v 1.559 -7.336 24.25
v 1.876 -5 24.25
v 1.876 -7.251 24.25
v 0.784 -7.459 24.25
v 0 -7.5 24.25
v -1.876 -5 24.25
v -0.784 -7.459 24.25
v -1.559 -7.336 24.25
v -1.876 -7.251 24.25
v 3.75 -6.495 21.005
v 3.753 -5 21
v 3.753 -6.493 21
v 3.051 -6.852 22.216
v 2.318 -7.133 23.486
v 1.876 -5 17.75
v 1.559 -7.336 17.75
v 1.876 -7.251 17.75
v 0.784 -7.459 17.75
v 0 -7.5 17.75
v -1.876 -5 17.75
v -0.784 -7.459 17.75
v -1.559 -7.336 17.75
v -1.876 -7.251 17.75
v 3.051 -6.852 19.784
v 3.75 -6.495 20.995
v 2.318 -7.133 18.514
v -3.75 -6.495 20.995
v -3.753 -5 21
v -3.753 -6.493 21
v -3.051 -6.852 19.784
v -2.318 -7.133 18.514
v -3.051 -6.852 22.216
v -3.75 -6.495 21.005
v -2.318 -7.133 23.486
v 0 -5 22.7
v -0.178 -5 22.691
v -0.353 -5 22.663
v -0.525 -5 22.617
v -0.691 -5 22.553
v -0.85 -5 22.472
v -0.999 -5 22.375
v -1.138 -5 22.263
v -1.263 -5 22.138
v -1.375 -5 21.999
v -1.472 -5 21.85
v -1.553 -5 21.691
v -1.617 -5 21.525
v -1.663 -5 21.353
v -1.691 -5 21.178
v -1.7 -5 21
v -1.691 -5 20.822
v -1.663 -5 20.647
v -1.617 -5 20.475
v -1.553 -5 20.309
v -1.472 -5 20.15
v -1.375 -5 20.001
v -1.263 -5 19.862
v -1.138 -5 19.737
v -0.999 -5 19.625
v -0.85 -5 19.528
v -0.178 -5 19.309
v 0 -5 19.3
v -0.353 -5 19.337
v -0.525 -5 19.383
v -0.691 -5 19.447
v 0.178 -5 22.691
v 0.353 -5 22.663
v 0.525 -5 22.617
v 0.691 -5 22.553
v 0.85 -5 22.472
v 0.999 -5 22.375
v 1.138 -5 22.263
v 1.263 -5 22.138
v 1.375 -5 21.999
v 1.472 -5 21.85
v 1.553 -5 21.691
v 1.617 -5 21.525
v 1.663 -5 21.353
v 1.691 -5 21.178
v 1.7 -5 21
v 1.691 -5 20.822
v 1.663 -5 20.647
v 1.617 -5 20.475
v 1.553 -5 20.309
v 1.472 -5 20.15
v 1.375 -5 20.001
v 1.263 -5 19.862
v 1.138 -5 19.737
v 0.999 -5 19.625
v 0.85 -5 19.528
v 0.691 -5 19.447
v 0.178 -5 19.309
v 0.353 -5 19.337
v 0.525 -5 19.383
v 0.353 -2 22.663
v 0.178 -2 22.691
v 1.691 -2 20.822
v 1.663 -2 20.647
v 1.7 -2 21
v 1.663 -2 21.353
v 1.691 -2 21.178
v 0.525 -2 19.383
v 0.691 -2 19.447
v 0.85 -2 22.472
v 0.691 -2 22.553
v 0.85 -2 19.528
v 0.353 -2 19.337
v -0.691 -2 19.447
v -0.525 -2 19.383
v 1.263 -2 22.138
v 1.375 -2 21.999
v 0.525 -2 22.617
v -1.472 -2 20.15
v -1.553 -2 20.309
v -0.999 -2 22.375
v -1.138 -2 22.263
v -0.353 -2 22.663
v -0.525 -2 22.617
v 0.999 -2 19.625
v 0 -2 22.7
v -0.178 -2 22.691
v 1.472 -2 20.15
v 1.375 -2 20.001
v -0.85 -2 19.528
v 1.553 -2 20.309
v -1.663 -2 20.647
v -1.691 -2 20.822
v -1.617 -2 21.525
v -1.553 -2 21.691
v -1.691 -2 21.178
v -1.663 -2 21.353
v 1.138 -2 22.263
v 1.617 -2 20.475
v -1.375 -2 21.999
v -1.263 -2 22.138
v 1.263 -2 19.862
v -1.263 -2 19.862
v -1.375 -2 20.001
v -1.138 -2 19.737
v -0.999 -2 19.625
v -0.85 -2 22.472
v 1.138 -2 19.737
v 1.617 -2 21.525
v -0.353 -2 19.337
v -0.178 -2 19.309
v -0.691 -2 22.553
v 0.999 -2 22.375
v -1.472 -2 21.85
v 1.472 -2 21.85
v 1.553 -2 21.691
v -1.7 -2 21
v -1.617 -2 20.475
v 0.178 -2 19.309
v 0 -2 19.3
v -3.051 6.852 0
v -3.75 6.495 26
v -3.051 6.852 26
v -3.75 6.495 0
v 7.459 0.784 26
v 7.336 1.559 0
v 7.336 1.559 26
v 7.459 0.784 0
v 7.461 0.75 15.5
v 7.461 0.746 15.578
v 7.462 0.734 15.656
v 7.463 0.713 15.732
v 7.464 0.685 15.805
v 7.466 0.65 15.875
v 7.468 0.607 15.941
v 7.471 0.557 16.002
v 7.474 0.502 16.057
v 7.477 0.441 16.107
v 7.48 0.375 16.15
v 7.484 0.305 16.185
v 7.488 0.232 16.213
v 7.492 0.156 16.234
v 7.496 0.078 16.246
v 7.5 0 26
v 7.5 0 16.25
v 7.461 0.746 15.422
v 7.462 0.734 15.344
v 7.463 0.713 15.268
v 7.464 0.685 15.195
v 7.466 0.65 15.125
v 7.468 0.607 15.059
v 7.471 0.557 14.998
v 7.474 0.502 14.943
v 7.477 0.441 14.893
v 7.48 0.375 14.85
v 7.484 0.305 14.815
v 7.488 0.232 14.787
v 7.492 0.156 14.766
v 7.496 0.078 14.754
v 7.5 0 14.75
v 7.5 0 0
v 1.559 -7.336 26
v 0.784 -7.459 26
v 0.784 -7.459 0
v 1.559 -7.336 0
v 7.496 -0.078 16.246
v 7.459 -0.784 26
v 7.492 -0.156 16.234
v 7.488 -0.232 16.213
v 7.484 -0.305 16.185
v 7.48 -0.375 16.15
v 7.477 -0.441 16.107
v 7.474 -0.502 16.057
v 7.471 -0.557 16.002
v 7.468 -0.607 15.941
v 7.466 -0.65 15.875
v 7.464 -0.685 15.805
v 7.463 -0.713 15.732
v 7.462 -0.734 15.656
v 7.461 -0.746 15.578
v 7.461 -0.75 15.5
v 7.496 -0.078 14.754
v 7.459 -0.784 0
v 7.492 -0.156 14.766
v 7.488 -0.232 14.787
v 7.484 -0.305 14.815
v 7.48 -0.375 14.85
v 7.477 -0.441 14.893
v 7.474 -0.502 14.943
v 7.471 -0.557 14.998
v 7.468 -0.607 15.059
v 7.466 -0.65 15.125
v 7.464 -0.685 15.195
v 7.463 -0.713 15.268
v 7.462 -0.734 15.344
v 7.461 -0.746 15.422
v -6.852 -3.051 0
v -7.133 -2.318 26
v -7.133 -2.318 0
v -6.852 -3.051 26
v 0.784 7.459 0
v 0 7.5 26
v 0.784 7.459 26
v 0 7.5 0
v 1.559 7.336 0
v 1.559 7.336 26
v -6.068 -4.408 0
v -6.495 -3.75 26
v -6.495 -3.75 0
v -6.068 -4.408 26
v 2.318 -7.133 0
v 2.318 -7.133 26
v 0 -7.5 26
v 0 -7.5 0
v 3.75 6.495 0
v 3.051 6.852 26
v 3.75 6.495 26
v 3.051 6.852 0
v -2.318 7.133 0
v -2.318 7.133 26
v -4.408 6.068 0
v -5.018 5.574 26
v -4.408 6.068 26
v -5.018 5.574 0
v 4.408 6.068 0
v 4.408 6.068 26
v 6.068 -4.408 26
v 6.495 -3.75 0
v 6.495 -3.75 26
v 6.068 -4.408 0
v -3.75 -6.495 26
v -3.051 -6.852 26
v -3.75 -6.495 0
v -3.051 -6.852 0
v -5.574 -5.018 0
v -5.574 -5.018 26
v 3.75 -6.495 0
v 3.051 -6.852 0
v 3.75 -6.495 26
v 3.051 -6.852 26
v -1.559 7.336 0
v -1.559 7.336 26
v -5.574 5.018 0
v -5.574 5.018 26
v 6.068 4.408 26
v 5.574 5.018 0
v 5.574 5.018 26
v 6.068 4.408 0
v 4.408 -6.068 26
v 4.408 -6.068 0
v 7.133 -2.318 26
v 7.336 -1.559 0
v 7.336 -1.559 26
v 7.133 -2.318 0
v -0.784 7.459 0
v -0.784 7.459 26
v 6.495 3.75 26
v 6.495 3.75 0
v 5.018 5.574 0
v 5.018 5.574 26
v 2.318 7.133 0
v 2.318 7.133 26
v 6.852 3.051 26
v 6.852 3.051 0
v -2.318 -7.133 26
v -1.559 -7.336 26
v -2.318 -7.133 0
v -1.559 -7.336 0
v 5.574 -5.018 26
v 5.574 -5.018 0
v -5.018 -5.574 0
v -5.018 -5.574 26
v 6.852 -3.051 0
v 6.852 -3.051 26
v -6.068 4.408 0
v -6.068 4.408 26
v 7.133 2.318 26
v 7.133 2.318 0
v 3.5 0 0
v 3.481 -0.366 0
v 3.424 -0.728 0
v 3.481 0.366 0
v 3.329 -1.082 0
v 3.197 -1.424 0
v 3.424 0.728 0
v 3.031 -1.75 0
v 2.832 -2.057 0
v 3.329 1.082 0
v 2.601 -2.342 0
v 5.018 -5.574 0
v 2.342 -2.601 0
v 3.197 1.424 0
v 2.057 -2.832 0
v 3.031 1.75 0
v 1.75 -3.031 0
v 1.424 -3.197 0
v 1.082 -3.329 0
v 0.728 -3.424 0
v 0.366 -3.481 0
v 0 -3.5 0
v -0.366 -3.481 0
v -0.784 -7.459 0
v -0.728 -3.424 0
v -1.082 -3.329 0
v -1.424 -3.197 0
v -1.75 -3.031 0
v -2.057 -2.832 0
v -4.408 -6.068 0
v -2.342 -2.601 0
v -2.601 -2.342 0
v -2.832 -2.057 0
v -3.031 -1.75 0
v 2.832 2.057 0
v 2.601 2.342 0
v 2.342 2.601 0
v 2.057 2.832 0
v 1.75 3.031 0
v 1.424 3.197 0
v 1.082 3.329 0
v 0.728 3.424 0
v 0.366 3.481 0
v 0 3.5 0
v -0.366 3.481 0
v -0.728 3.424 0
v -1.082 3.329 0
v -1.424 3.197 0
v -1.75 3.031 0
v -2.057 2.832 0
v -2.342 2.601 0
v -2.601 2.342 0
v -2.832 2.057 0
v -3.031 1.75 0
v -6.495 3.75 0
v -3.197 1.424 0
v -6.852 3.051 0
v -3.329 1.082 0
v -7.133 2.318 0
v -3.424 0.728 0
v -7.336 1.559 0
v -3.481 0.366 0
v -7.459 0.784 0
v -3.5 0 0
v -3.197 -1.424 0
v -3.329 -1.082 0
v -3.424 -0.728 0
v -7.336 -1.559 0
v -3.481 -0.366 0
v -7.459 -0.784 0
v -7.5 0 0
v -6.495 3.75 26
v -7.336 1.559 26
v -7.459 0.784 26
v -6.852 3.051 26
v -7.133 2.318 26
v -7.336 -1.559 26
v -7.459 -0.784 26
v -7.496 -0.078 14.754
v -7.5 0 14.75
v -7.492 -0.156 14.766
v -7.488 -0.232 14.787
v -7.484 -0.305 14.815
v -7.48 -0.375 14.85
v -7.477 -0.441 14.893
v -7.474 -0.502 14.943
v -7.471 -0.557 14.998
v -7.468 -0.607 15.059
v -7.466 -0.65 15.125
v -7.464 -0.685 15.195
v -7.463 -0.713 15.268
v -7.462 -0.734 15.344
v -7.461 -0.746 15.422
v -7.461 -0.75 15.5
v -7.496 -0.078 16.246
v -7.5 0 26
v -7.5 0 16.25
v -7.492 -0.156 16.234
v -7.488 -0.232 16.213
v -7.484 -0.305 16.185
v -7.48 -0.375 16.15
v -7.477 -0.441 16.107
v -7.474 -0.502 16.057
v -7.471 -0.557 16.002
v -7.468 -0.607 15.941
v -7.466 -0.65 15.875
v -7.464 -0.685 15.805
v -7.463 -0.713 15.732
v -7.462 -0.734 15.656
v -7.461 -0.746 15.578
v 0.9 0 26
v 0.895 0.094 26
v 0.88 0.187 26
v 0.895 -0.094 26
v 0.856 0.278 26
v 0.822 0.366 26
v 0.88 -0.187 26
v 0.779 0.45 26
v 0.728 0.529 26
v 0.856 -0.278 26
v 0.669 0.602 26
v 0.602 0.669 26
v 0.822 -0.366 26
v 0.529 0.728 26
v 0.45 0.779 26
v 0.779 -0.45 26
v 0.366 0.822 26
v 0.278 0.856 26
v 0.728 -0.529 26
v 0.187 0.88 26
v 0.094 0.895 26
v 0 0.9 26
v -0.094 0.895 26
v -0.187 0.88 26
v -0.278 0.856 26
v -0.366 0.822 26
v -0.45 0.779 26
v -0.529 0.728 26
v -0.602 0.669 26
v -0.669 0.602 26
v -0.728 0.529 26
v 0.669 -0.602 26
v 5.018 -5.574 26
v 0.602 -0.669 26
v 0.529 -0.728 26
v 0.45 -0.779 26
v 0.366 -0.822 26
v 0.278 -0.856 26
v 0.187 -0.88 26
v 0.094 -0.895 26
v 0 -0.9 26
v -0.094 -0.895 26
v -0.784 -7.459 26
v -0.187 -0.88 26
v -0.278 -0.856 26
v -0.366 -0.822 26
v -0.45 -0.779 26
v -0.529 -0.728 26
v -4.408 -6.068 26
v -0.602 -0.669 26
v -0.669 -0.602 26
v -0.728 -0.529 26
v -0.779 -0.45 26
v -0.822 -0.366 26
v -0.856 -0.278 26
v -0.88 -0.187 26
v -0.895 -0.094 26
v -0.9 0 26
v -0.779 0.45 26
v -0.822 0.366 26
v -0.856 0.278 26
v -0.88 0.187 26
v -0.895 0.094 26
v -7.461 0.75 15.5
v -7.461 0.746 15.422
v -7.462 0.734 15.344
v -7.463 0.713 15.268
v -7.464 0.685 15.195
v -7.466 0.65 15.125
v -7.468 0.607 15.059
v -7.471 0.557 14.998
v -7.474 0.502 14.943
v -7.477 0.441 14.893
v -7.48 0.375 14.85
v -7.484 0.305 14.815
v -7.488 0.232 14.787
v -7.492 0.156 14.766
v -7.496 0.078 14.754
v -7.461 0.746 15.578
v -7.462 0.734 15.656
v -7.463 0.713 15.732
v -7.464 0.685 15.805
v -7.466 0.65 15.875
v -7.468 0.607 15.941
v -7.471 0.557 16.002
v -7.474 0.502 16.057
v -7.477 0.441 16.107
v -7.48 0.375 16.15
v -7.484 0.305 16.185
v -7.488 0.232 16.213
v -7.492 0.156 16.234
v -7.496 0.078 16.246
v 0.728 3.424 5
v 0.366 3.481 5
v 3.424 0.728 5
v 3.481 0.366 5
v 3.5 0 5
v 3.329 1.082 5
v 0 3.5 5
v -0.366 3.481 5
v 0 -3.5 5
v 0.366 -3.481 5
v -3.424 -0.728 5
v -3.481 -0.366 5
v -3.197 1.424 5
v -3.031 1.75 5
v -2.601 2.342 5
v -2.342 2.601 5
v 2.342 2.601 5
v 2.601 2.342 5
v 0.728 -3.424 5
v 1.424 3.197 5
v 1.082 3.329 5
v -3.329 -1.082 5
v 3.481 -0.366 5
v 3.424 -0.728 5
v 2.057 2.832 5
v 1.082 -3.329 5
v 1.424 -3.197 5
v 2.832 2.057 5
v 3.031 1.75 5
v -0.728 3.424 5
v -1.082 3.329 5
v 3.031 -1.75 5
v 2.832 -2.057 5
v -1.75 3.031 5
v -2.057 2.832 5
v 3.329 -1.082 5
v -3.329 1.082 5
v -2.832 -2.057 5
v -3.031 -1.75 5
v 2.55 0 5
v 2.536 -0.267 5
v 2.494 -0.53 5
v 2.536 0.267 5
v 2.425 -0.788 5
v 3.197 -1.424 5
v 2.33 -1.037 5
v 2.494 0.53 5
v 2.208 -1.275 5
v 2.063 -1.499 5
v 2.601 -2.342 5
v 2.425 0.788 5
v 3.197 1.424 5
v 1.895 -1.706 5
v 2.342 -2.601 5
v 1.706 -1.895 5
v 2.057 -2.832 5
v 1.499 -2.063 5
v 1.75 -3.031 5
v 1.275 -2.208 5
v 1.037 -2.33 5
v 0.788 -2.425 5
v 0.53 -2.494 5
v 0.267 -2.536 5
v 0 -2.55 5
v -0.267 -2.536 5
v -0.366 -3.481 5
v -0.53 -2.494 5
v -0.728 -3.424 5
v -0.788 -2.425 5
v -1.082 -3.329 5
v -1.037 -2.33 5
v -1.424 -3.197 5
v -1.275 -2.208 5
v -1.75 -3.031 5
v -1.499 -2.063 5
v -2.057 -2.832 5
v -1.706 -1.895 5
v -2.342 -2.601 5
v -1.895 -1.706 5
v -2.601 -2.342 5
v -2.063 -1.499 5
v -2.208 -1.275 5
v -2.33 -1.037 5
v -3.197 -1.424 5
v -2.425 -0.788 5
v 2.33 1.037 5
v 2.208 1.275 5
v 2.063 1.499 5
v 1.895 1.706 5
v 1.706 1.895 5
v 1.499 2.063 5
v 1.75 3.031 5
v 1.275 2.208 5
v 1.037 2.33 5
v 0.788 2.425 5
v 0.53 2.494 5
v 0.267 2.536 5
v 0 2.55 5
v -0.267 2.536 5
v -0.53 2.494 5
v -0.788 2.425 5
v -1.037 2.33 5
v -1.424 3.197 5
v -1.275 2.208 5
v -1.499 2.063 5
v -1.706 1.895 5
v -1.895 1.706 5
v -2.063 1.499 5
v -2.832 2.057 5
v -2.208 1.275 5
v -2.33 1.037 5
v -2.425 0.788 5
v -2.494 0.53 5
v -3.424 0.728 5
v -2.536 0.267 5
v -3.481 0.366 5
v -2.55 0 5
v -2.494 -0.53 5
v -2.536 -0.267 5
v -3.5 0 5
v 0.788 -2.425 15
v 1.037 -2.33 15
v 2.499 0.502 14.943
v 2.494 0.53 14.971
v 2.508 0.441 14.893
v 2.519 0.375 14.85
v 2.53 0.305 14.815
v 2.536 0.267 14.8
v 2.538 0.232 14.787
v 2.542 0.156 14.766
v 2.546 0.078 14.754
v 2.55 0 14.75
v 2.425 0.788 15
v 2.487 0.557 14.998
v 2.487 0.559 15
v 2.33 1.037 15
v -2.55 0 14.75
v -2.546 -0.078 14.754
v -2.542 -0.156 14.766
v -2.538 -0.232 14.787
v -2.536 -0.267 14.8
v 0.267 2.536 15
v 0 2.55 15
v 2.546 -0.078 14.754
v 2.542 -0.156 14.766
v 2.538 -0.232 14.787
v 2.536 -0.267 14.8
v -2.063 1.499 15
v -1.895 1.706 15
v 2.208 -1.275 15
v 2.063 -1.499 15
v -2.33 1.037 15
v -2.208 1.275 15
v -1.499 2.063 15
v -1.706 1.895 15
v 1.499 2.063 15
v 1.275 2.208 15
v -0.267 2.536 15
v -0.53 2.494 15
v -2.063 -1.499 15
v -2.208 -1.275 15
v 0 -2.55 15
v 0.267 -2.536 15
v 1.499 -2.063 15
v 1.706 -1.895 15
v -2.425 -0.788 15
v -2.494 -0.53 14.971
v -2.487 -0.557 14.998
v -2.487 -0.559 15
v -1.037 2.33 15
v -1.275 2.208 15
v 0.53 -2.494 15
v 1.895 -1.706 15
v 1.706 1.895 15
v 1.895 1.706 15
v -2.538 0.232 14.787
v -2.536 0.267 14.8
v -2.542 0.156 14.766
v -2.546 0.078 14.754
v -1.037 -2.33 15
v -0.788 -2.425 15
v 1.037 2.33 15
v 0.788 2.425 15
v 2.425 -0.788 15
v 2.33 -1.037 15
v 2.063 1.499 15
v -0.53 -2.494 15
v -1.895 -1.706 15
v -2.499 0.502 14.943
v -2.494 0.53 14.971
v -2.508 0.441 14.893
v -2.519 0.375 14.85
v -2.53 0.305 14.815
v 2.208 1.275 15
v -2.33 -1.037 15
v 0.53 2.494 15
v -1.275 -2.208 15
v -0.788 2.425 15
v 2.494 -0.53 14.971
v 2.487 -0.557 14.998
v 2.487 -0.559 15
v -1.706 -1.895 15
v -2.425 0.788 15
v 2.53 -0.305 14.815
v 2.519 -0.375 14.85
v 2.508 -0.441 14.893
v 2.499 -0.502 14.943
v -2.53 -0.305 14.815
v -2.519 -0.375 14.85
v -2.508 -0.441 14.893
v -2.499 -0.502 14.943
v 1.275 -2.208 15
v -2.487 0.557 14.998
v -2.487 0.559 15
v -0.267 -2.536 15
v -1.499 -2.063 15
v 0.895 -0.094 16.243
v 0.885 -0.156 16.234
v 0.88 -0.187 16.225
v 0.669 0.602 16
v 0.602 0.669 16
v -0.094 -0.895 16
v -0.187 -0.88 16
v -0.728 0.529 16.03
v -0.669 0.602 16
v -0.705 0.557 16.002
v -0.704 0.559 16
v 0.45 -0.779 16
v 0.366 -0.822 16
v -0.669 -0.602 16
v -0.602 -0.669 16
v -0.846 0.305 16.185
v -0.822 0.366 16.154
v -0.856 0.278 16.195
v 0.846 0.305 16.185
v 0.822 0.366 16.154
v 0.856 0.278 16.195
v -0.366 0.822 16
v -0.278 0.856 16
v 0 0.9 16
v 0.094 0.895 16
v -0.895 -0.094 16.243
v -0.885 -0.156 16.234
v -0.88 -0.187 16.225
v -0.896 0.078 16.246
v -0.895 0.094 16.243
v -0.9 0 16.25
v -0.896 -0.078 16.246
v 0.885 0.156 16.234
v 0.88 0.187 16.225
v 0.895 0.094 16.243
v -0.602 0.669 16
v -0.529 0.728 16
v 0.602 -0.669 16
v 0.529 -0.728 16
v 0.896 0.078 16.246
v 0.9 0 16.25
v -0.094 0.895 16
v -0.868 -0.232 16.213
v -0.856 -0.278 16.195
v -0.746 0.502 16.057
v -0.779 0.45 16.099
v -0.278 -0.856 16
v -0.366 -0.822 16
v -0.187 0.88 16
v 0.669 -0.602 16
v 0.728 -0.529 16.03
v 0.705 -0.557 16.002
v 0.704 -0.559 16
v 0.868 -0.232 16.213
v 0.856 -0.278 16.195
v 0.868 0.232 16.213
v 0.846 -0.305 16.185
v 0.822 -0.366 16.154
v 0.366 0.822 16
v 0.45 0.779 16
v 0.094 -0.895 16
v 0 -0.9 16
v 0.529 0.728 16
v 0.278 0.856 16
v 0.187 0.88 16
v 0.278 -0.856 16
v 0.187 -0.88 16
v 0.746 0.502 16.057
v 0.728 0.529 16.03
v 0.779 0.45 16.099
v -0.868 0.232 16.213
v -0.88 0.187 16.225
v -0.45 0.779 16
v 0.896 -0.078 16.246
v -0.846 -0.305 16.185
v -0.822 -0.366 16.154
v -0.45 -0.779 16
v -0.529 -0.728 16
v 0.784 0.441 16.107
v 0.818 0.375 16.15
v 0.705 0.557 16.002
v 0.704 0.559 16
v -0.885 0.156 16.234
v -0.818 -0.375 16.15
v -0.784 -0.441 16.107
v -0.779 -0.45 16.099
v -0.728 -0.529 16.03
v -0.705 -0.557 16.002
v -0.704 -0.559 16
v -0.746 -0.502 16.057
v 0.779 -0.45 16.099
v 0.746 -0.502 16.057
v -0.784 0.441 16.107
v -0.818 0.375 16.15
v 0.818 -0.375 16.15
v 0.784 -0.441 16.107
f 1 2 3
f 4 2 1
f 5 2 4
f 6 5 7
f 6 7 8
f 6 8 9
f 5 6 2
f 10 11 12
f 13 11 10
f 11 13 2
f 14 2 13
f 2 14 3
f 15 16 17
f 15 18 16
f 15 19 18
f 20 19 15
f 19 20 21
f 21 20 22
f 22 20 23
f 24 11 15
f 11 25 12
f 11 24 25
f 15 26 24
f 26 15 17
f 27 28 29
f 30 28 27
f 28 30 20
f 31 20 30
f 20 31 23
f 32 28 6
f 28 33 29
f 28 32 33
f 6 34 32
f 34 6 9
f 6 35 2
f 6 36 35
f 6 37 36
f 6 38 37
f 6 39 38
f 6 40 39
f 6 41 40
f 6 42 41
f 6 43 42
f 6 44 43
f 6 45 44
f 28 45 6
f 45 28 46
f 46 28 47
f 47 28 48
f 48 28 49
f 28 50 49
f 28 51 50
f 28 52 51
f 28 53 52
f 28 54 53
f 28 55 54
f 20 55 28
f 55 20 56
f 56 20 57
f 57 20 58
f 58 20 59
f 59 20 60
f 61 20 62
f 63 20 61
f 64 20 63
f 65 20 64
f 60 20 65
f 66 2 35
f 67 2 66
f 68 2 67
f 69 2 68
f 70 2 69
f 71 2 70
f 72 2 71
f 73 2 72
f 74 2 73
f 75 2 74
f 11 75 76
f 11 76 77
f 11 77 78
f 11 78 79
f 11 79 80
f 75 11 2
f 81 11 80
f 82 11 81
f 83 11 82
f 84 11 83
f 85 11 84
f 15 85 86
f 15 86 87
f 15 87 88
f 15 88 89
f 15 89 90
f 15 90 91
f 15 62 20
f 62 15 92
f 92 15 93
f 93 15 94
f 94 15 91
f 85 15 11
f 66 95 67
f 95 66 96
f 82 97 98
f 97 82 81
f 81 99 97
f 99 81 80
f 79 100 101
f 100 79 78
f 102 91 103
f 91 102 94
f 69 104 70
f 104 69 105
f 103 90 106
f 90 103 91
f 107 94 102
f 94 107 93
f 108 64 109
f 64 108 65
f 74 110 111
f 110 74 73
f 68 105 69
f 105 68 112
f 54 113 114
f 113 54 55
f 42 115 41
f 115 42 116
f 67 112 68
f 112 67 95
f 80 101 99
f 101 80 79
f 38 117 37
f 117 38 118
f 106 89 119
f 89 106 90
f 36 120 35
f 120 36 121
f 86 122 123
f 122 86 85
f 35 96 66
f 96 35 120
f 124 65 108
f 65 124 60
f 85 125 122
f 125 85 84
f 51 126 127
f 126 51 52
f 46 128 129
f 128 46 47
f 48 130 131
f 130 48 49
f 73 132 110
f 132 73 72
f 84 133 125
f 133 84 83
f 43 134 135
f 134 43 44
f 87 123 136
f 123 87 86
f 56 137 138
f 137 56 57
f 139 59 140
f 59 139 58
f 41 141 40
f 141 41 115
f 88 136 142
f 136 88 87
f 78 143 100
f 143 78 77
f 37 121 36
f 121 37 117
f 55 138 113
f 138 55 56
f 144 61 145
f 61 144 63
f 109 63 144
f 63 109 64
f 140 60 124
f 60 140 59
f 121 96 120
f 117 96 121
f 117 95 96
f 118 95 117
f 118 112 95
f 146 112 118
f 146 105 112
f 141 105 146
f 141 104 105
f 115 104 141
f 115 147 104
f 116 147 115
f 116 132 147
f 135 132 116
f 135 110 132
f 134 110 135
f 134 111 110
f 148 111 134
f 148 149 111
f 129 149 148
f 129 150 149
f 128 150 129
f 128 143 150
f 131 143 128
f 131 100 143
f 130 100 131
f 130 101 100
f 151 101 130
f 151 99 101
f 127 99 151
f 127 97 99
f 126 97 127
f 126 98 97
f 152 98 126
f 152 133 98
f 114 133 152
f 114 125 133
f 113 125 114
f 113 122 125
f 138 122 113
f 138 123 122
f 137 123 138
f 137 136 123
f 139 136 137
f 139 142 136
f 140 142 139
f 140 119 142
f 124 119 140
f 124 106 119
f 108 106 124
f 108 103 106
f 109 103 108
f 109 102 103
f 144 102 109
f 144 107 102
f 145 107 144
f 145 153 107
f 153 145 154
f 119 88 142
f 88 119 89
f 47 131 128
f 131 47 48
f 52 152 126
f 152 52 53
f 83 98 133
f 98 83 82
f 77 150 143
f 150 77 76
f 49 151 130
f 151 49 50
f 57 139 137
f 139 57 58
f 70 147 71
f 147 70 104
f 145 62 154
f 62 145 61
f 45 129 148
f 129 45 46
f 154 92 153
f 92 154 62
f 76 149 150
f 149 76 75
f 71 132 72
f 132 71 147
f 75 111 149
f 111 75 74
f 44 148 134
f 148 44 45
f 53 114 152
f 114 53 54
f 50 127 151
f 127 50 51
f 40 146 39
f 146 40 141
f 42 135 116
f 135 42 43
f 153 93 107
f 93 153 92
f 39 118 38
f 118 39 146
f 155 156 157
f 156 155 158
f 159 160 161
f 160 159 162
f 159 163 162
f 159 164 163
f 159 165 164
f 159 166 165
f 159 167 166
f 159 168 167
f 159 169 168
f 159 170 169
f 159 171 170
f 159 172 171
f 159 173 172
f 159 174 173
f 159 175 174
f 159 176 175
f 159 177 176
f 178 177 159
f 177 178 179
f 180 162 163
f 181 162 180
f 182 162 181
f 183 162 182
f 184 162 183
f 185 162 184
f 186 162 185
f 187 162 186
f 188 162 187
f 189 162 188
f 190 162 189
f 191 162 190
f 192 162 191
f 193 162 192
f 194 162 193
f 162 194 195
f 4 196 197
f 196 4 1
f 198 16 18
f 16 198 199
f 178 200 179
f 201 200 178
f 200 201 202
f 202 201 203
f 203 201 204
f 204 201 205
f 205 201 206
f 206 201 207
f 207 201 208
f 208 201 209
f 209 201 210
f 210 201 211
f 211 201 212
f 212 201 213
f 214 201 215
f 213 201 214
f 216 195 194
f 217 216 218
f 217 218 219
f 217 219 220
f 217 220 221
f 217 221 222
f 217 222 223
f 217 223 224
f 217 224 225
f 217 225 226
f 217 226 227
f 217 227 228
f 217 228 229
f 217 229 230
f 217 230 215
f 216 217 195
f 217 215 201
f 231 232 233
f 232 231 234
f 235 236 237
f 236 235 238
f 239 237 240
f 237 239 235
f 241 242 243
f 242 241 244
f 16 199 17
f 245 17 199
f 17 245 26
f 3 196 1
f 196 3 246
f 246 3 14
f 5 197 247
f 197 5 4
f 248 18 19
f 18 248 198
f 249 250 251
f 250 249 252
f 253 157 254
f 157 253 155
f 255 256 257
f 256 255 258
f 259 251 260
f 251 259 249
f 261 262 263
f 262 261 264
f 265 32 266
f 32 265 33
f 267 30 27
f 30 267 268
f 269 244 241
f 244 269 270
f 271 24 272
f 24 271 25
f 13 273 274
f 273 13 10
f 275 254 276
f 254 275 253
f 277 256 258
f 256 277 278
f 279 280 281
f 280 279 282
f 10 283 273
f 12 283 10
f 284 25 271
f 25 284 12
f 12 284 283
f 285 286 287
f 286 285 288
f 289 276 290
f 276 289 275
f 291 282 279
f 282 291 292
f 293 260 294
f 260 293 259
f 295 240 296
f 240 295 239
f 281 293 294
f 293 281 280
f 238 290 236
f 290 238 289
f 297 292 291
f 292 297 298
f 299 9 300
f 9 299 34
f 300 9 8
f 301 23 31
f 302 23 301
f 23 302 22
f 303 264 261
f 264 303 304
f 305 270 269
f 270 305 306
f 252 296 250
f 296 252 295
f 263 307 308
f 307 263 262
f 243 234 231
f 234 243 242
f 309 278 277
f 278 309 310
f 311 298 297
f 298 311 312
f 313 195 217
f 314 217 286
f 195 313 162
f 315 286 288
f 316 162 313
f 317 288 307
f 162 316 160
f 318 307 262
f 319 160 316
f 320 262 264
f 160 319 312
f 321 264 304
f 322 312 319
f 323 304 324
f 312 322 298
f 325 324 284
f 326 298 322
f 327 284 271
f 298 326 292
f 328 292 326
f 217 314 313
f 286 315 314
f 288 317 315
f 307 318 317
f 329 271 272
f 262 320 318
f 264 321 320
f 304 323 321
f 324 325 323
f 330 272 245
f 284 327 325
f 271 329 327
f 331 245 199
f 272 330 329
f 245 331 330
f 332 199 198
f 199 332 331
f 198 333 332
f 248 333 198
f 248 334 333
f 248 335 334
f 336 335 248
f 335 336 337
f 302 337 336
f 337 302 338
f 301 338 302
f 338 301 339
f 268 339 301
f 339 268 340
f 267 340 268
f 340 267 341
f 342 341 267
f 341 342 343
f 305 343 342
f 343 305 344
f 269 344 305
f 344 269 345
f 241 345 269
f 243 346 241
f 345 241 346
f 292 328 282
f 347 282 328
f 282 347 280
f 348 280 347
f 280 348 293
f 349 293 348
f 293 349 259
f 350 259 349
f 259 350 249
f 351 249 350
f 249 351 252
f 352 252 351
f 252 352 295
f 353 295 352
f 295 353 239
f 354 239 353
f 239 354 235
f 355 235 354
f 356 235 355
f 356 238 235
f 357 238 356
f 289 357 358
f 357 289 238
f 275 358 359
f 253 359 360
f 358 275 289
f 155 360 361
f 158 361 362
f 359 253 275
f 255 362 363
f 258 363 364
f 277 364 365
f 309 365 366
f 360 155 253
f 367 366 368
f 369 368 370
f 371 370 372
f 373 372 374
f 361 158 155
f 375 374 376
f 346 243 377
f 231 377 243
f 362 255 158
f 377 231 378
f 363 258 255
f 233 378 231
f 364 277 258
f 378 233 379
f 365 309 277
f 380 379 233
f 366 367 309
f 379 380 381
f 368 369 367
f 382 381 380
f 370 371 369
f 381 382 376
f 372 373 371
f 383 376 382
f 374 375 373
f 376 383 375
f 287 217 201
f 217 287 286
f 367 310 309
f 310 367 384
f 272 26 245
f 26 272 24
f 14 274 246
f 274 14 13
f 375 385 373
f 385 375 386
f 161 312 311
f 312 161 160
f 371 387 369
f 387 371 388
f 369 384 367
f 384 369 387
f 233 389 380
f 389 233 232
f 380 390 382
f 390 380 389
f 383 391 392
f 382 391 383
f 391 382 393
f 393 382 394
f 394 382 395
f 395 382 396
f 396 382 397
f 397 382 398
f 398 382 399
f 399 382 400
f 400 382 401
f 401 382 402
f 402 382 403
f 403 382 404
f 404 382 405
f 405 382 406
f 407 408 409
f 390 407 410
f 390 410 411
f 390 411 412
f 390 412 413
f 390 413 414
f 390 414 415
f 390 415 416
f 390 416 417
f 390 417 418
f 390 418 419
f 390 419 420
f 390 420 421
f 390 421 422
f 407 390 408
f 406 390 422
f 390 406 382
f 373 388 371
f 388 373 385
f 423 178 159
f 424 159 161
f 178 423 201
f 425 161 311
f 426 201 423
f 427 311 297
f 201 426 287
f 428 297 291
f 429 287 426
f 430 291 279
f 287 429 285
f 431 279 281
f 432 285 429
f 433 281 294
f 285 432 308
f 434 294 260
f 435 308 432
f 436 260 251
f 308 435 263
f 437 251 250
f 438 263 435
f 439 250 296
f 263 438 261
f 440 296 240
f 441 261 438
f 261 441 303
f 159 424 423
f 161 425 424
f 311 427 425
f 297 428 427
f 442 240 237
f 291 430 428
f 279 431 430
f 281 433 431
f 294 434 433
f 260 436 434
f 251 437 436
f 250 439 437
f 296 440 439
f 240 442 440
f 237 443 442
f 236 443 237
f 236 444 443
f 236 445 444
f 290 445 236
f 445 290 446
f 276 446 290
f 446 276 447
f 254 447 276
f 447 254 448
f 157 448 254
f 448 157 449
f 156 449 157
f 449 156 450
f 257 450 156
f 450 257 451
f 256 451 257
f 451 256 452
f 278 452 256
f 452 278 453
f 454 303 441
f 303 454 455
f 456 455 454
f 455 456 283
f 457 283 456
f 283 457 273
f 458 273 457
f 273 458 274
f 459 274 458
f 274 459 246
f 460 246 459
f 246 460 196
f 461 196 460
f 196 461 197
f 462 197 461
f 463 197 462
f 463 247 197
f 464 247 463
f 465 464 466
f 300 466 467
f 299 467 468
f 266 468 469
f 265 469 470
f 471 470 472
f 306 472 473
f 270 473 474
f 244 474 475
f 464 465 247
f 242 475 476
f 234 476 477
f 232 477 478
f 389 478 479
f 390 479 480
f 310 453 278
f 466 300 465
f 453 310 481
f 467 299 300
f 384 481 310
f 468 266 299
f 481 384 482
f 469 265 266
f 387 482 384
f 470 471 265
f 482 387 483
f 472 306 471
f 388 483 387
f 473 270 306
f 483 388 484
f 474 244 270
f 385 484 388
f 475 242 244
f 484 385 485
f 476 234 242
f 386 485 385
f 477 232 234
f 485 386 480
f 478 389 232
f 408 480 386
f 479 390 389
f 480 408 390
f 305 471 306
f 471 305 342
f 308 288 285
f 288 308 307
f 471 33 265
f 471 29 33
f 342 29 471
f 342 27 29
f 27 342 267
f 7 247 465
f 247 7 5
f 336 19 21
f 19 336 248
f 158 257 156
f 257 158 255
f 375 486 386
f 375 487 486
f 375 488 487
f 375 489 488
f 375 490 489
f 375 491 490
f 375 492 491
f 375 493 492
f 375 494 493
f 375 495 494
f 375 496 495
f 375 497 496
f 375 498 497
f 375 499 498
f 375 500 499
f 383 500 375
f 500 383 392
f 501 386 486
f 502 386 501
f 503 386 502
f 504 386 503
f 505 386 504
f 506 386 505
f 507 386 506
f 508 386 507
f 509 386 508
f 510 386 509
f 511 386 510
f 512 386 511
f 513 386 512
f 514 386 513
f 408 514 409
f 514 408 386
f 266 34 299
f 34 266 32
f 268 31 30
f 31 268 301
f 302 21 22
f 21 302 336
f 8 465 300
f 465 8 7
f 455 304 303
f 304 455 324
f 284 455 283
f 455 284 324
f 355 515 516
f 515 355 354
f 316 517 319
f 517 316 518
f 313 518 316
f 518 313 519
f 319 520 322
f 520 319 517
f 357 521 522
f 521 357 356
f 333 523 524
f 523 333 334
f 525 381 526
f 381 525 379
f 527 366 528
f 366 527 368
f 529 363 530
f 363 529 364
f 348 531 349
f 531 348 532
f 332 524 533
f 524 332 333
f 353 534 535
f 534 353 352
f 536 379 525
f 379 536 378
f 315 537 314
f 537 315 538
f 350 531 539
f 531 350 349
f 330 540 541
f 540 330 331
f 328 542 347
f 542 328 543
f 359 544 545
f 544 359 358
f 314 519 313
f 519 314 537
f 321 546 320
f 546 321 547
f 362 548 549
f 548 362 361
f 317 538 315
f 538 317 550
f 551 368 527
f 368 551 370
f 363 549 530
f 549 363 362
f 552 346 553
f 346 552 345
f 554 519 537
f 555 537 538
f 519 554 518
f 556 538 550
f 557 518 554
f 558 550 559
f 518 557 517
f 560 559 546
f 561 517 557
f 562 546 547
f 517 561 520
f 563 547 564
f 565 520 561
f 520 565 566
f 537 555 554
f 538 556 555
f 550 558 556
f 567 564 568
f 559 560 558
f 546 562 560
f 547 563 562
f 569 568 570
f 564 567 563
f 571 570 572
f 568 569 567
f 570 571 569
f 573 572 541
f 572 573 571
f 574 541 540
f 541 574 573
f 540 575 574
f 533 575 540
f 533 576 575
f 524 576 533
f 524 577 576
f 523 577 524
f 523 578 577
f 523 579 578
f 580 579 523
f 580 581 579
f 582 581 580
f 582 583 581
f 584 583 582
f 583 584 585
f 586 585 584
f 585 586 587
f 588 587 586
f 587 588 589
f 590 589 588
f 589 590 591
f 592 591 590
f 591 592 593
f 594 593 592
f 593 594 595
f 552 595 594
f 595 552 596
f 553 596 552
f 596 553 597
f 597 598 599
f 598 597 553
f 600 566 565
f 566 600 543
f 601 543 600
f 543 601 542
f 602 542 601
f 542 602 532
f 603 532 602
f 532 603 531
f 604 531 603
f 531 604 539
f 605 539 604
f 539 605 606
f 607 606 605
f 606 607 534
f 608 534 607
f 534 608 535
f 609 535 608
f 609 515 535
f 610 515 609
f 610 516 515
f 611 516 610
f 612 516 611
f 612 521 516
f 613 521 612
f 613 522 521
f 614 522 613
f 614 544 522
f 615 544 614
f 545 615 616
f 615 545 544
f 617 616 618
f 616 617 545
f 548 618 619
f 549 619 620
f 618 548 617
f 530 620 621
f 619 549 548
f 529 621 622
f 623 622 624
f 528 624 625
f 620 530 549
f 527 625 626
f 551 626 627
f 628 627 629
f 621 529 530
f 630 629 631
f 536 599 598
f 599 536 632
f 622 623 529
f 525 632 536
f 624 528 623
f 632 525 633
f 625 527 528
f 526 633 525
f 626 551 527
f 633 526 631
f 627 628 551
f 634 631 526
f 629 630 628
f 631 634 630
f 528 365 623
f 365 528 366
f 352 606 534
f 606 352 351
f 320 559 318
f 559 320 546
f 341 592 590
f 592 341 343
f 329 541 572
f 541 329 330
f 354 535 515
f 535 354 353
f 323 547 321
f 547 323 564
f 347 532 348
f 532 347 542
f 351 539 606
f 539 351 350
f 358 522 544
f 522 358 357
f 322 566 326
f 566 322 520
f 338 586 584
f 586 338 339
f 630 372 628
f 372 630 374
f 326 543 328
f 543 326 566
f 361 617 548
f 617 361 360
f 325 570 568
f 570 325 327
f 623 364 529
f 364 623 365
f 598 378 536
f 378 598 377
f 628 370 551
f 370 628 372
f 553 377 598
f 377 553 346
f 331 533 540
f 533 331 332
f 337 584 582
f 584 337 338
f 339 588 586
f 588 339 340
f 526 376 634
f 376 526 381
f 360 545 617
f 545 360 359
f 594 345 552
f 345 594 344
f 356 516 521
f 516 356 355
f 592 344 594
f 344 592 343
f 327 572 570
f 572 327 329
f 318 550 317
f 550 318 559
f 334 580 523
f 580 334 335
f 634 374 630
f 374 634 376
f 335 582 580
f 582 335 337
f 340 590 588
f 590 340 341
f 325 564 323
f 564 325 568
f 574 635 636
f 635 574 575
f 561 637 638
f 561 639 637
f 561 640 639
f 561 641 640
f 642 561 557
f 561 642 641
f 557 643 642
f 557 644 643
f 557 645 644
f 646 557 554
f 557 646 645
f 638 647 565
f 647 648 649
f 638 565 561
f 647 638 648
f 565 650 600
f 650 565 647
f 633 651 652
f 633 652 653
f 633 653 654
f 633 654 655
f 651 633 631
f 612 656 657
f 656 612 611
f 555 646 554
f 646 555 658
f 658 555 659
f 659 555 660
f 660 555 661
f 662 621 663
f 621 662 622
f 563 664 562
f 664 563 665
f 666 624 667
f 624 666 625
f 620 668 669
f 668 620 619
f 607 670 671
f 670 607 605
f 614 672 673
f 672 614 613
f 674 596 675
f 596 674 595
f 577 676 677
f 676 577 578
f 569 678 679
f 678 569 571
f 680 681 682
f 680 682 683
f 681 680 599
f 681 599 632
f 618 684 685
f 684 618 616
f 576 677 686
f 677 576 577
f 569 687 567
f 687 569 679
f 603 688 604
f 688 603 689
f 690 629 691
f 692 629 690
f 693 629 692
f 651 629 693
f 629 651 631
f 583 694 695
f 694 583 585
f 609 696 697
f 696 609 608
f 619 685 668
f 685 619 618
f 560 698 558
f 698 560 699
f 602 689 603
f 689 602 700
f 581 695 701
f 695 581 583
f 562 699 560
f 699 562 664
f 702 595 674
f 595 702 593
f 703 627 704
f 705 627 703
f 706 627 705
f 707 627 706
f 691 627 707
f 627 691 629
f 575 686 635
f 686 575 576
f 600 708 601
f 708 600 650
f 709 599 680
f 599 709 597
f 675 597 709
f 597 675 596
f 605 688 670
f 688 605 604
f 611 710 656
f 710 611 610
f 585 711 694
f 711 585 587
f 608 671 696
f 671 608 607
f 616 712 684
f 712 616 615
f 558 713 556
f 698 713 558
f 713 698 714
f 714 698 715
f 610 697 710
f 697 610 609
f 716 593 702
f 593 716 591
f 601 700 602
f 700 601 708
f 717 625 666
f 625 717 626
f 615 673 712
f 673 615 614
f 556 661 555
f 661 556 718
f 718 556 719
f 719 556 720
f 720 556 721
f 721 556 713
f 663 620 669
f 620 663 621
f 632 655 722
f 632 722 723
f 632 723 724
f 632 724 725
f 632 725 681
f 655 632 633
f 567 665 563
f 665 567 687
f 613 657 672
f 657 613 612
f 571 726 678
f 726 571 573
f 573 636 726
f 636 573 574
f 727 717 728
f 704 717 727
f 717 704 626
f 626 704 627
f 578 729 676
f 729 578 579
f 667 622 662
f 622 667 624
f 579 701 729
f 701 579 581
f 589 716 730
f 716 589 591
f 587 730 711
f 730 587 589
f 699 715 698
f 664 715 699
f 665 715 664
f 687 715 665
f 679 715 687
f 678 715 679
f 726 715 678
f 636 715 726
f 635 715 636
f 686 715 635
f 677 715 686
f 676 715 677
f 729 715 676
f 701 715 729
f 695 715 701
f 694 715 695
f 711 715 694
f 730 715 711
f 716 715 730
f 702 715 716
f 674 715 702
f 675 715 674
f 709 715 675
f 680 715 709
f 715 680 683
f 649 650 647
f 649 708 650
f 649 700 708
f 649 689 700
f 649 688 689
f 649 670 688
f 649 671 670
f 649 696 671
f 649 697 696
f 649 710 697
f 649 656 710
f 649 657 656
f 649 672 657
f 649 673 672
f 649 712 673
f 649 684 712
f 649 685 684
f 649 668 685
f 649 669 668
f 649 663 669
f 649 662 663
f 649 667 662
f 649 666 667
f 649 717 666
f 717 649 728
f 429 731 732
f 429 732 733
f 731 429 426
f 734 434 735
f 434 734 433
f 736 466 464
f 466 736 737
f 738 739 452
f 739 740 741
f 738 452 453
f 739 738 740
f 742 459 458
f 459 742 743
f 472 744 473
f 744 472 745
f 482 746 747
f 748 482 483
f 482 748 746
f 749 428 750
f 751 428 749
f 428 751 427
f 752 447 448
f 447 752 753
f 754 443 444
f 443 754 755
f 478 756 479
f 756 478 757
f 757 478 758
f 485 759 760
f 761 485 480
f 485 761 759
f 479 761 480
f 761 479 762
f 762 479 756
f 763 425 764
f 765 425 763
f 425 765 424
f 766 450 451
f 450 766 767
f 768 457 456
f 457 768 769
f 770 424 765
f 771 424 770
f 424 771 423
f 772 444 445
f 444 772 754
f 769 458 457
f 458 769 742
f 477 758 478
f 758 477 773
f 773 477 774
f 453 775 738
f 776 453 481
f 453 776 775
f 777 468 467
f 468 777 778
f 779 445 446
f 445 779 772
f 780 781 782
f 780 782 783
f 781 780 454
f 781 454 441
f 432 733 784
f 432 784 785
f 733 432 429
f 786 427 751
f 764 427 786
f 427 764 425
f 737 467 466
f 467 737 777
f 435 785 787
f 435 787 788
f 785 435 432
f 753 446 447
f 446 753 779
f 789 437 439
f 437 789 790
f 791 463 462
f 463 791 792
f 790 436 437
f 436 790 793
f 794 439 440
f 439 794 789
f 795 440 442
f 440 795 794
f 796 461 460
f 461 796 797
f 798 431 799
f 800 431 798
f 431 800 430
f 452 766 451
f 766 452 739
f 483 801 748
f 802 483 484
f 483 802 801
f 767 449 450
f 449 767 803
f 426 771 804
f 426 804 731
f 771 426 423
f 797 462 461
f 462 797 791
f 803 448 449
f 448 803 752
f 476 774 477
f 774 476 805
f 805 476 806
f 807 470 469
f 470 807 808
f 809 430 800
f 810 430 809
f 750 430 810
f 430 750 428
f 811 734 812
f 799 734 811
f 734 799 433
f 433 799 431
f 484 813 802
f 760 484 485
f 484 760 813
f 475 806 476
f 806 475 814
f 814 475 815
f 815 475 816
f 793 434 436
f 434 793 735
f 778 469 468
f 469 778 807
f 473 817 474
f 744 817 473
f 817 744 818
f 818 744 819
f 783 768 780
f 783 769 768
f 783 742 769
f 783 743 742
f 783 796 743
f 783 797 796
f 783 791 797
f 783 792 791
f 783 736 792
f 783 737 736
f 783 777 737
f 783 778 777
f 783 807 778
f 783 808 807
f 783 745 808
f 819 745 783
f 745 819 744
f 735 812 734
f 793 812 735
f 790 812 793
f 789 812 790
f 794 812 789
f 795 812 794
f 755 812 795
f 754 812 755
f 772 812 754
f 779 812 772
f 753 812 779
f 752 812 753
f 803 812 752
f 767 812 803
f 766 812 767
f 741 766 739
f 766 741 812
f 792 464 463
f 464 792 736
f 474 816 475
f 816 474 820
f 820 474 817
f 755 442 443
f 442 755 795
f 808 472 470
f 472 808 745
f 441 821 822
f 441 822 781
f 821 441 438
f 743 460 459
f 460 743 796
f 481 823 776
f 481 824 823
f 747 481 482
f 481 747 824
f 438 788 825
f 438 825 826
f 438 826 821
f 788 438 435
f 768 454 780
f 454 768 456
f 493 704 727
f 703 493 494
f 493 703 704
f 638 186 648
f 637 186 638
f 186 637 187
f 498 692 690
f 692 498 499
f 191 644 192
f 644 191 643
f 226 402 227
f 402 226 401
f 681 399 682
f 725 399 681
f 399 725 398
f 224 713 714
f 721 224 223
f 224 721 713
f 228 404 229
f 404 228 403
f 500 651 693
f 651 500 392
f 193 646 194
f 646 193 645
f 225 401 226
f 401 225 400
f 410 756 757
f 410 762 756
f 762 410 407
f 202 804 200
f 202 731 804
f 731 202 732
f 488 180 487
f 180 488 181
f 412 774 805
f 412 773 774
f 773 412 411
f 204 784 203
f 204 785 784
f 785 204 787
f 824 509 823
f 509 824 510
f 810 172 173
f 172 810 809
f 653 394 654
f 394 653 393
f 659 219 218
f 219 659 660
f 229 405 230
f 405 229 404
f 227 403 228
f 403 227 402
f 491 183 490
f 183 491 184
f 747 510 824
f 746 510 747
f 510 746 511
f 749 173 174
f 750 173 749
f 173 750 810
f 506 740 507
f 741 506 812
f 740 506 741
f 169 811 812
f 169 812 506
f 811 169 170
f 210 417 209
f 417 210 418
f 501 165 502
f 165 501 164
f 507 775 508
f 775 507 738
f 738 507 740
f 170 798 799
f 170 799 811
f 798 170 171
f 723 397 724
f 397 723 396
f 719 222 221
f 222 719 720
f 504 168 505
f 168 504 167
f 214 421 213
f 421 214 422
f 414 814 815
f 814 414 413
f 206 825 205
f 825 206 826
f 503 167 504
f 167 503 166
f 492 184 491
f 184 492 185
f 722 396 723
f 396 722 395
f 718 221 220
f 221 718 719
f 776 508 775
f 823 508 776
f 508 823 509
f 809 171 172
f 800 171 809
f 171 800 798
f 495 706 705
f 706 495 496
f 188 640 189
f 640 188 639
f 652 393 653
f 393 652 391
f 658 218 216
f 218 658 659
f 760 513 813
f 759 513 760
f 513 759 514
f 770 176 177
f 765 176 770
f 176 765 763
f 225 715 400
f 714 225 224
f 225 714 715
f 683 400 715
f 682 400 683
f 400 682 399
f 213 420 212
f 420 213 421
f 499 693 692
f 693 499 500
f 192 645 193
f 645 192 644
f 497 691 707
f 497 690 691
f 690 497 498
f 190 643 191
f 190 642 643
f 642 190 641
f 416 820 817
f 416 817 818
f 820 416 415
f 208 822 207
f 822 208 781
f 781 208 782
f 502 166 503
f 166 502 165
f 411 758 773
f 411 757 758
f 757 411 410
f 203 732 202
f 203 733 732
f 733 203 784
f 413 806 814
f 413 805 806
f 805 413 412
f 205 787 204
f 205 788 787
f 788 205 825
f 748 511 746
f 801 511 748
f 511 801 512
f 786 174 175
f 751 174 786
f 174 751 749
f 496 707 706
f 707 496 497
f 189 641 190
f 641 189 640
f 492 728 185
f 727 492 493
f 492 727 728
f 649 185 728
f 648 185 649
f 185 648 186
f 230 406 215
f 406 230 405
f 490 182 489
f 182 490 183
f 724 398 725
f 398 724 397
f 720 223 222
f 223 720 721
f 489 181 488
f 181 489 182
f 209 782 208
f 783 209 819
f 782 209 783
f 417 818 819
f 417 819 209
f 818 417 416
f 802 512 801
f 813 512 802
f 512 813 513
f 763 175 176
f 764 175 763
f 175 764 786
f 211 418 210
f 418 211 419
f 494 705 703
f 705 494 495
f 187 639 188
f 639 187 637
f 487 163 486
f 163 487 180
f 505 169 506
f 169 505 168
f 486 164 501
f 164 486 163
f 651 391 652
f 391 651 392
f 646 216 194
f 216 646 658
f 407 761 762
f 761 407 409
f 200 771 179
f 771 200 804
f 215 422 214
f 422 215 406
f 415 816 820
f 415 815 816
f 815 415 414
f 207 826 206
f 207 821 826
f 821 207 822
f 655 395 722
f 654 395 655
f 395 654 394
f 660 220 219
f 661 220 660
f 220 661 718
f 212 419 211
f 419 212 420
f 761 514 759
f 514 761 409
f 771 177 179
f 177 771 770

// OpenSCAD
// ============================================
// led_fiber_coupler.scad
// 5mm 砲弾型 LED と POF 端面を同軸に保持するシリンダ。
// 軸方向：LED 側 → POF 側 = +Z 方向。
// 印刷向き：軸を垂直に立て、LED 挿入側（z=0）を build plate 側にして印刷。サポート不要。
//
// z マップ（底面 z=0 から）:
//   z =  0 ..  5   Ø7    リード逃げザグリ（led_back_cap の Ø6.9 boss が圧入される）
//   z =  5 .. 15   Ø5.1  LED 本体穴（10mm、LED 砲弾 8mm を余裕をもって収納）
//   z = 15 .. 16   実体  LED 上面と POF 端面を隔てる 1mm の壁
//   z = 16 .. 26   Ø1.8  POF 縦穴
// ============================================

include <params.scad>

// --- 外形 ---
coupler_d = 15;                                            // シリンダ直径

// セグメント長（積み上げ式に定義）
led_pof_wall_t   = 1.0;                                    // LED 上面と POF 端面の間の壁厚
pof_side_l       = 10.0;                                   // POF 縦穴の長さ
coupler_l        = led_lead_clearance_mm                   // 5
                 + led_body_depth_mm                       // 10
                 + led_pof_wall_t                          // 1
                 + pof_side_l;                             // 10  → 計 26

lead_zagri_d     = 7.0;
side_monitor_d   = 1.5;

// LED 本体穴の z 開始位置（リード逃げの上に積む）
led_body_z0      = led_lead_clearance_mm;                  // = 5
// POF 縦穴の z 開始位置（壁の上）
pof_z0           = led_body_z0 + led_body_depth_mm + led_pof_wall_t;  // = 16

// M3 ナットトラップ（POF セクション中央付近）
nut_trap_z         = pof_z0 + pof_side_l / 2;              // = 21
nut_across_flats   = 6.5;
nut_pocket_depth   = 2.5;
m3_clearance_d     = 3.4;
m3_extra_engagement = 3.0;

eps = 0.01;

module led_fiber_coupler() {
    difference() {
        cylinder(d = coupler_d, h = coupler_l);

        // --- LED 側 (z = 0 端面) ---
        // (1) リード逃げザグリ Ø7 × 5mm（底面端から）
        translate([0, 0, -eps])
            cylinder(d = lead_zagri_d, h = led_lead_clearance_mm + eps);

        // (2) LED 本体の埋め込み穴 Ø5.1 × 8mm（リード逃げの上に積む）
        translate([0, 0, led_body_z0])
            cylinder(d = led_diameter_mm, h = led_body_depth_mm);

        // --- POF 側 (z = coupler_l 端面) ---
        // POF チャネル Ø1.8 × 10mm（縦穴の熱収縮を見込んで径を大きく取る）
        translate([0, 0, pof_z0])
            cylinder(d = pof_channel_width_led_side_mm, h = pof_side_l + eps);

        // --- 側面の光モニタ穴（任意）---
        // LED 上面と POF 端面の間の壁（z=15..16）を貫く位置で、両側を覗ける。
        // 直径方向に貫通。X 軸に沿わせる。
        translate([0, 0, led_body_z0 + led_body_depth_mm + led_pof_wall_t / 2])  // = 15.5
            rotate([0, 90, 0])
                cylinder(d = side_monitor_d, h = coupler_d + 2, center = true);

        // --- 側面 M3 ナットトラップ（任意、ベンチ固定用）---
        // -Y 側の側壁から内側へ。POF 中心穴 (Ø1.8) には届かない深さ。
        translate([0, -coupler_d / 2 - eps, nut_trap_z])
            rotate([-90, 0, 0]) {
                cylinder(
                    d = nut_across_flats / cos(30),
                    h = nut_pocket_depth + eps,
                    $fn = 6
                );
                cylinder(
                    d = m3_clearance_d,
                    h = nut_pocket_depth + m3_extra_engagement + eps
                );
            }
    }
}

// ============================================
// (2) LED cradle（別パーツ）
// led_fiber_coupler を baseplate（camera_fiber_coupler プレート貫通）上で
// 共通 POF 軸 z = pof_axis_z_above_baseplate_mm に保持する。
// 内部 Ø15 半円ポケットで coupler 円筒を抱きとめ、上から M3 で固定。
// 印刷向き：底面を build plate に密着、ポケット側を上向き。サポート不要。
// ============================================
module led_cradle() {
    cw   = led_cradle_outer_w_mm;
    cl   = 26;                                // = LED coupler 長
    ch   = led_cradle_outer_h_mm;
    wall = led_cradle_wall_mm;
    // ポケット軸 z（cradle ローカル底面 z=0 基準）= pof_axis_z_above_baseplate_mm
    axis_z = pof_axis_z_above_baseplate_mm;
    pocket_d = coupler_d + 0.4;               // Ø15.4（嵌合余裕）

    difference() {
        // 外形
        cube([cl, cw, ch]);

        // 円筒ポケット（cradle 長さを X 方向に貫通）
        translate([-eps, cw / 2, axis_z])
            rotate([0, 90, 0])
                cylinder(d = pocket_d, h = cl + 2 * eps);

        // 上面開口（円筒上半分を露出させて抜き差しを容易にする）
        translate([-eps, wall, axis_z])
            cube([cl + 2 * eps, cw - 2 * wall, ch - axis_z + eps]);

        // 4 隅 M3 通し穴（baseplate に貫通）
        for (xi = [led_cradle_mount_inset_mm,
                   cl - led_cradle_mount_inset_mm])
            for (yi = [led_cradle_mount_inset_mm,
                       cw - led_cradle_mount_inset_mm])
                translate([xi, yi, -eps])
                    cylinder(d = m3_clearance_d_common_mm,
                             h = ch + 2 * eps);

        // LED リード逃げ：-X 端面（LED 側）に Ø7 の通し穴を pof 軸高さで切る
        translate([-eps, cw / 2, axis_z])
            rotate([0, 90, 0])
                cylinder(d = lead_zagri_d + 0.4, h = wall + eps);
    }
}

// ============================================
// レンダ選択
// 既定は coupler 単体（既存挙動）。assembly 表示する場合は下行を使う。
// ============================================
led_fiber_coupler();
// led_cradle();
// 組立プレビュー：coupler を cradle 内に寝かせた状態
// translate([0, led_cradle_outer_w_mm / 2, pof_axis_z_above_baseplate_mm])
//     rotate([0, 90, 0]) led_fiber_coupler();
// led_cradle();
